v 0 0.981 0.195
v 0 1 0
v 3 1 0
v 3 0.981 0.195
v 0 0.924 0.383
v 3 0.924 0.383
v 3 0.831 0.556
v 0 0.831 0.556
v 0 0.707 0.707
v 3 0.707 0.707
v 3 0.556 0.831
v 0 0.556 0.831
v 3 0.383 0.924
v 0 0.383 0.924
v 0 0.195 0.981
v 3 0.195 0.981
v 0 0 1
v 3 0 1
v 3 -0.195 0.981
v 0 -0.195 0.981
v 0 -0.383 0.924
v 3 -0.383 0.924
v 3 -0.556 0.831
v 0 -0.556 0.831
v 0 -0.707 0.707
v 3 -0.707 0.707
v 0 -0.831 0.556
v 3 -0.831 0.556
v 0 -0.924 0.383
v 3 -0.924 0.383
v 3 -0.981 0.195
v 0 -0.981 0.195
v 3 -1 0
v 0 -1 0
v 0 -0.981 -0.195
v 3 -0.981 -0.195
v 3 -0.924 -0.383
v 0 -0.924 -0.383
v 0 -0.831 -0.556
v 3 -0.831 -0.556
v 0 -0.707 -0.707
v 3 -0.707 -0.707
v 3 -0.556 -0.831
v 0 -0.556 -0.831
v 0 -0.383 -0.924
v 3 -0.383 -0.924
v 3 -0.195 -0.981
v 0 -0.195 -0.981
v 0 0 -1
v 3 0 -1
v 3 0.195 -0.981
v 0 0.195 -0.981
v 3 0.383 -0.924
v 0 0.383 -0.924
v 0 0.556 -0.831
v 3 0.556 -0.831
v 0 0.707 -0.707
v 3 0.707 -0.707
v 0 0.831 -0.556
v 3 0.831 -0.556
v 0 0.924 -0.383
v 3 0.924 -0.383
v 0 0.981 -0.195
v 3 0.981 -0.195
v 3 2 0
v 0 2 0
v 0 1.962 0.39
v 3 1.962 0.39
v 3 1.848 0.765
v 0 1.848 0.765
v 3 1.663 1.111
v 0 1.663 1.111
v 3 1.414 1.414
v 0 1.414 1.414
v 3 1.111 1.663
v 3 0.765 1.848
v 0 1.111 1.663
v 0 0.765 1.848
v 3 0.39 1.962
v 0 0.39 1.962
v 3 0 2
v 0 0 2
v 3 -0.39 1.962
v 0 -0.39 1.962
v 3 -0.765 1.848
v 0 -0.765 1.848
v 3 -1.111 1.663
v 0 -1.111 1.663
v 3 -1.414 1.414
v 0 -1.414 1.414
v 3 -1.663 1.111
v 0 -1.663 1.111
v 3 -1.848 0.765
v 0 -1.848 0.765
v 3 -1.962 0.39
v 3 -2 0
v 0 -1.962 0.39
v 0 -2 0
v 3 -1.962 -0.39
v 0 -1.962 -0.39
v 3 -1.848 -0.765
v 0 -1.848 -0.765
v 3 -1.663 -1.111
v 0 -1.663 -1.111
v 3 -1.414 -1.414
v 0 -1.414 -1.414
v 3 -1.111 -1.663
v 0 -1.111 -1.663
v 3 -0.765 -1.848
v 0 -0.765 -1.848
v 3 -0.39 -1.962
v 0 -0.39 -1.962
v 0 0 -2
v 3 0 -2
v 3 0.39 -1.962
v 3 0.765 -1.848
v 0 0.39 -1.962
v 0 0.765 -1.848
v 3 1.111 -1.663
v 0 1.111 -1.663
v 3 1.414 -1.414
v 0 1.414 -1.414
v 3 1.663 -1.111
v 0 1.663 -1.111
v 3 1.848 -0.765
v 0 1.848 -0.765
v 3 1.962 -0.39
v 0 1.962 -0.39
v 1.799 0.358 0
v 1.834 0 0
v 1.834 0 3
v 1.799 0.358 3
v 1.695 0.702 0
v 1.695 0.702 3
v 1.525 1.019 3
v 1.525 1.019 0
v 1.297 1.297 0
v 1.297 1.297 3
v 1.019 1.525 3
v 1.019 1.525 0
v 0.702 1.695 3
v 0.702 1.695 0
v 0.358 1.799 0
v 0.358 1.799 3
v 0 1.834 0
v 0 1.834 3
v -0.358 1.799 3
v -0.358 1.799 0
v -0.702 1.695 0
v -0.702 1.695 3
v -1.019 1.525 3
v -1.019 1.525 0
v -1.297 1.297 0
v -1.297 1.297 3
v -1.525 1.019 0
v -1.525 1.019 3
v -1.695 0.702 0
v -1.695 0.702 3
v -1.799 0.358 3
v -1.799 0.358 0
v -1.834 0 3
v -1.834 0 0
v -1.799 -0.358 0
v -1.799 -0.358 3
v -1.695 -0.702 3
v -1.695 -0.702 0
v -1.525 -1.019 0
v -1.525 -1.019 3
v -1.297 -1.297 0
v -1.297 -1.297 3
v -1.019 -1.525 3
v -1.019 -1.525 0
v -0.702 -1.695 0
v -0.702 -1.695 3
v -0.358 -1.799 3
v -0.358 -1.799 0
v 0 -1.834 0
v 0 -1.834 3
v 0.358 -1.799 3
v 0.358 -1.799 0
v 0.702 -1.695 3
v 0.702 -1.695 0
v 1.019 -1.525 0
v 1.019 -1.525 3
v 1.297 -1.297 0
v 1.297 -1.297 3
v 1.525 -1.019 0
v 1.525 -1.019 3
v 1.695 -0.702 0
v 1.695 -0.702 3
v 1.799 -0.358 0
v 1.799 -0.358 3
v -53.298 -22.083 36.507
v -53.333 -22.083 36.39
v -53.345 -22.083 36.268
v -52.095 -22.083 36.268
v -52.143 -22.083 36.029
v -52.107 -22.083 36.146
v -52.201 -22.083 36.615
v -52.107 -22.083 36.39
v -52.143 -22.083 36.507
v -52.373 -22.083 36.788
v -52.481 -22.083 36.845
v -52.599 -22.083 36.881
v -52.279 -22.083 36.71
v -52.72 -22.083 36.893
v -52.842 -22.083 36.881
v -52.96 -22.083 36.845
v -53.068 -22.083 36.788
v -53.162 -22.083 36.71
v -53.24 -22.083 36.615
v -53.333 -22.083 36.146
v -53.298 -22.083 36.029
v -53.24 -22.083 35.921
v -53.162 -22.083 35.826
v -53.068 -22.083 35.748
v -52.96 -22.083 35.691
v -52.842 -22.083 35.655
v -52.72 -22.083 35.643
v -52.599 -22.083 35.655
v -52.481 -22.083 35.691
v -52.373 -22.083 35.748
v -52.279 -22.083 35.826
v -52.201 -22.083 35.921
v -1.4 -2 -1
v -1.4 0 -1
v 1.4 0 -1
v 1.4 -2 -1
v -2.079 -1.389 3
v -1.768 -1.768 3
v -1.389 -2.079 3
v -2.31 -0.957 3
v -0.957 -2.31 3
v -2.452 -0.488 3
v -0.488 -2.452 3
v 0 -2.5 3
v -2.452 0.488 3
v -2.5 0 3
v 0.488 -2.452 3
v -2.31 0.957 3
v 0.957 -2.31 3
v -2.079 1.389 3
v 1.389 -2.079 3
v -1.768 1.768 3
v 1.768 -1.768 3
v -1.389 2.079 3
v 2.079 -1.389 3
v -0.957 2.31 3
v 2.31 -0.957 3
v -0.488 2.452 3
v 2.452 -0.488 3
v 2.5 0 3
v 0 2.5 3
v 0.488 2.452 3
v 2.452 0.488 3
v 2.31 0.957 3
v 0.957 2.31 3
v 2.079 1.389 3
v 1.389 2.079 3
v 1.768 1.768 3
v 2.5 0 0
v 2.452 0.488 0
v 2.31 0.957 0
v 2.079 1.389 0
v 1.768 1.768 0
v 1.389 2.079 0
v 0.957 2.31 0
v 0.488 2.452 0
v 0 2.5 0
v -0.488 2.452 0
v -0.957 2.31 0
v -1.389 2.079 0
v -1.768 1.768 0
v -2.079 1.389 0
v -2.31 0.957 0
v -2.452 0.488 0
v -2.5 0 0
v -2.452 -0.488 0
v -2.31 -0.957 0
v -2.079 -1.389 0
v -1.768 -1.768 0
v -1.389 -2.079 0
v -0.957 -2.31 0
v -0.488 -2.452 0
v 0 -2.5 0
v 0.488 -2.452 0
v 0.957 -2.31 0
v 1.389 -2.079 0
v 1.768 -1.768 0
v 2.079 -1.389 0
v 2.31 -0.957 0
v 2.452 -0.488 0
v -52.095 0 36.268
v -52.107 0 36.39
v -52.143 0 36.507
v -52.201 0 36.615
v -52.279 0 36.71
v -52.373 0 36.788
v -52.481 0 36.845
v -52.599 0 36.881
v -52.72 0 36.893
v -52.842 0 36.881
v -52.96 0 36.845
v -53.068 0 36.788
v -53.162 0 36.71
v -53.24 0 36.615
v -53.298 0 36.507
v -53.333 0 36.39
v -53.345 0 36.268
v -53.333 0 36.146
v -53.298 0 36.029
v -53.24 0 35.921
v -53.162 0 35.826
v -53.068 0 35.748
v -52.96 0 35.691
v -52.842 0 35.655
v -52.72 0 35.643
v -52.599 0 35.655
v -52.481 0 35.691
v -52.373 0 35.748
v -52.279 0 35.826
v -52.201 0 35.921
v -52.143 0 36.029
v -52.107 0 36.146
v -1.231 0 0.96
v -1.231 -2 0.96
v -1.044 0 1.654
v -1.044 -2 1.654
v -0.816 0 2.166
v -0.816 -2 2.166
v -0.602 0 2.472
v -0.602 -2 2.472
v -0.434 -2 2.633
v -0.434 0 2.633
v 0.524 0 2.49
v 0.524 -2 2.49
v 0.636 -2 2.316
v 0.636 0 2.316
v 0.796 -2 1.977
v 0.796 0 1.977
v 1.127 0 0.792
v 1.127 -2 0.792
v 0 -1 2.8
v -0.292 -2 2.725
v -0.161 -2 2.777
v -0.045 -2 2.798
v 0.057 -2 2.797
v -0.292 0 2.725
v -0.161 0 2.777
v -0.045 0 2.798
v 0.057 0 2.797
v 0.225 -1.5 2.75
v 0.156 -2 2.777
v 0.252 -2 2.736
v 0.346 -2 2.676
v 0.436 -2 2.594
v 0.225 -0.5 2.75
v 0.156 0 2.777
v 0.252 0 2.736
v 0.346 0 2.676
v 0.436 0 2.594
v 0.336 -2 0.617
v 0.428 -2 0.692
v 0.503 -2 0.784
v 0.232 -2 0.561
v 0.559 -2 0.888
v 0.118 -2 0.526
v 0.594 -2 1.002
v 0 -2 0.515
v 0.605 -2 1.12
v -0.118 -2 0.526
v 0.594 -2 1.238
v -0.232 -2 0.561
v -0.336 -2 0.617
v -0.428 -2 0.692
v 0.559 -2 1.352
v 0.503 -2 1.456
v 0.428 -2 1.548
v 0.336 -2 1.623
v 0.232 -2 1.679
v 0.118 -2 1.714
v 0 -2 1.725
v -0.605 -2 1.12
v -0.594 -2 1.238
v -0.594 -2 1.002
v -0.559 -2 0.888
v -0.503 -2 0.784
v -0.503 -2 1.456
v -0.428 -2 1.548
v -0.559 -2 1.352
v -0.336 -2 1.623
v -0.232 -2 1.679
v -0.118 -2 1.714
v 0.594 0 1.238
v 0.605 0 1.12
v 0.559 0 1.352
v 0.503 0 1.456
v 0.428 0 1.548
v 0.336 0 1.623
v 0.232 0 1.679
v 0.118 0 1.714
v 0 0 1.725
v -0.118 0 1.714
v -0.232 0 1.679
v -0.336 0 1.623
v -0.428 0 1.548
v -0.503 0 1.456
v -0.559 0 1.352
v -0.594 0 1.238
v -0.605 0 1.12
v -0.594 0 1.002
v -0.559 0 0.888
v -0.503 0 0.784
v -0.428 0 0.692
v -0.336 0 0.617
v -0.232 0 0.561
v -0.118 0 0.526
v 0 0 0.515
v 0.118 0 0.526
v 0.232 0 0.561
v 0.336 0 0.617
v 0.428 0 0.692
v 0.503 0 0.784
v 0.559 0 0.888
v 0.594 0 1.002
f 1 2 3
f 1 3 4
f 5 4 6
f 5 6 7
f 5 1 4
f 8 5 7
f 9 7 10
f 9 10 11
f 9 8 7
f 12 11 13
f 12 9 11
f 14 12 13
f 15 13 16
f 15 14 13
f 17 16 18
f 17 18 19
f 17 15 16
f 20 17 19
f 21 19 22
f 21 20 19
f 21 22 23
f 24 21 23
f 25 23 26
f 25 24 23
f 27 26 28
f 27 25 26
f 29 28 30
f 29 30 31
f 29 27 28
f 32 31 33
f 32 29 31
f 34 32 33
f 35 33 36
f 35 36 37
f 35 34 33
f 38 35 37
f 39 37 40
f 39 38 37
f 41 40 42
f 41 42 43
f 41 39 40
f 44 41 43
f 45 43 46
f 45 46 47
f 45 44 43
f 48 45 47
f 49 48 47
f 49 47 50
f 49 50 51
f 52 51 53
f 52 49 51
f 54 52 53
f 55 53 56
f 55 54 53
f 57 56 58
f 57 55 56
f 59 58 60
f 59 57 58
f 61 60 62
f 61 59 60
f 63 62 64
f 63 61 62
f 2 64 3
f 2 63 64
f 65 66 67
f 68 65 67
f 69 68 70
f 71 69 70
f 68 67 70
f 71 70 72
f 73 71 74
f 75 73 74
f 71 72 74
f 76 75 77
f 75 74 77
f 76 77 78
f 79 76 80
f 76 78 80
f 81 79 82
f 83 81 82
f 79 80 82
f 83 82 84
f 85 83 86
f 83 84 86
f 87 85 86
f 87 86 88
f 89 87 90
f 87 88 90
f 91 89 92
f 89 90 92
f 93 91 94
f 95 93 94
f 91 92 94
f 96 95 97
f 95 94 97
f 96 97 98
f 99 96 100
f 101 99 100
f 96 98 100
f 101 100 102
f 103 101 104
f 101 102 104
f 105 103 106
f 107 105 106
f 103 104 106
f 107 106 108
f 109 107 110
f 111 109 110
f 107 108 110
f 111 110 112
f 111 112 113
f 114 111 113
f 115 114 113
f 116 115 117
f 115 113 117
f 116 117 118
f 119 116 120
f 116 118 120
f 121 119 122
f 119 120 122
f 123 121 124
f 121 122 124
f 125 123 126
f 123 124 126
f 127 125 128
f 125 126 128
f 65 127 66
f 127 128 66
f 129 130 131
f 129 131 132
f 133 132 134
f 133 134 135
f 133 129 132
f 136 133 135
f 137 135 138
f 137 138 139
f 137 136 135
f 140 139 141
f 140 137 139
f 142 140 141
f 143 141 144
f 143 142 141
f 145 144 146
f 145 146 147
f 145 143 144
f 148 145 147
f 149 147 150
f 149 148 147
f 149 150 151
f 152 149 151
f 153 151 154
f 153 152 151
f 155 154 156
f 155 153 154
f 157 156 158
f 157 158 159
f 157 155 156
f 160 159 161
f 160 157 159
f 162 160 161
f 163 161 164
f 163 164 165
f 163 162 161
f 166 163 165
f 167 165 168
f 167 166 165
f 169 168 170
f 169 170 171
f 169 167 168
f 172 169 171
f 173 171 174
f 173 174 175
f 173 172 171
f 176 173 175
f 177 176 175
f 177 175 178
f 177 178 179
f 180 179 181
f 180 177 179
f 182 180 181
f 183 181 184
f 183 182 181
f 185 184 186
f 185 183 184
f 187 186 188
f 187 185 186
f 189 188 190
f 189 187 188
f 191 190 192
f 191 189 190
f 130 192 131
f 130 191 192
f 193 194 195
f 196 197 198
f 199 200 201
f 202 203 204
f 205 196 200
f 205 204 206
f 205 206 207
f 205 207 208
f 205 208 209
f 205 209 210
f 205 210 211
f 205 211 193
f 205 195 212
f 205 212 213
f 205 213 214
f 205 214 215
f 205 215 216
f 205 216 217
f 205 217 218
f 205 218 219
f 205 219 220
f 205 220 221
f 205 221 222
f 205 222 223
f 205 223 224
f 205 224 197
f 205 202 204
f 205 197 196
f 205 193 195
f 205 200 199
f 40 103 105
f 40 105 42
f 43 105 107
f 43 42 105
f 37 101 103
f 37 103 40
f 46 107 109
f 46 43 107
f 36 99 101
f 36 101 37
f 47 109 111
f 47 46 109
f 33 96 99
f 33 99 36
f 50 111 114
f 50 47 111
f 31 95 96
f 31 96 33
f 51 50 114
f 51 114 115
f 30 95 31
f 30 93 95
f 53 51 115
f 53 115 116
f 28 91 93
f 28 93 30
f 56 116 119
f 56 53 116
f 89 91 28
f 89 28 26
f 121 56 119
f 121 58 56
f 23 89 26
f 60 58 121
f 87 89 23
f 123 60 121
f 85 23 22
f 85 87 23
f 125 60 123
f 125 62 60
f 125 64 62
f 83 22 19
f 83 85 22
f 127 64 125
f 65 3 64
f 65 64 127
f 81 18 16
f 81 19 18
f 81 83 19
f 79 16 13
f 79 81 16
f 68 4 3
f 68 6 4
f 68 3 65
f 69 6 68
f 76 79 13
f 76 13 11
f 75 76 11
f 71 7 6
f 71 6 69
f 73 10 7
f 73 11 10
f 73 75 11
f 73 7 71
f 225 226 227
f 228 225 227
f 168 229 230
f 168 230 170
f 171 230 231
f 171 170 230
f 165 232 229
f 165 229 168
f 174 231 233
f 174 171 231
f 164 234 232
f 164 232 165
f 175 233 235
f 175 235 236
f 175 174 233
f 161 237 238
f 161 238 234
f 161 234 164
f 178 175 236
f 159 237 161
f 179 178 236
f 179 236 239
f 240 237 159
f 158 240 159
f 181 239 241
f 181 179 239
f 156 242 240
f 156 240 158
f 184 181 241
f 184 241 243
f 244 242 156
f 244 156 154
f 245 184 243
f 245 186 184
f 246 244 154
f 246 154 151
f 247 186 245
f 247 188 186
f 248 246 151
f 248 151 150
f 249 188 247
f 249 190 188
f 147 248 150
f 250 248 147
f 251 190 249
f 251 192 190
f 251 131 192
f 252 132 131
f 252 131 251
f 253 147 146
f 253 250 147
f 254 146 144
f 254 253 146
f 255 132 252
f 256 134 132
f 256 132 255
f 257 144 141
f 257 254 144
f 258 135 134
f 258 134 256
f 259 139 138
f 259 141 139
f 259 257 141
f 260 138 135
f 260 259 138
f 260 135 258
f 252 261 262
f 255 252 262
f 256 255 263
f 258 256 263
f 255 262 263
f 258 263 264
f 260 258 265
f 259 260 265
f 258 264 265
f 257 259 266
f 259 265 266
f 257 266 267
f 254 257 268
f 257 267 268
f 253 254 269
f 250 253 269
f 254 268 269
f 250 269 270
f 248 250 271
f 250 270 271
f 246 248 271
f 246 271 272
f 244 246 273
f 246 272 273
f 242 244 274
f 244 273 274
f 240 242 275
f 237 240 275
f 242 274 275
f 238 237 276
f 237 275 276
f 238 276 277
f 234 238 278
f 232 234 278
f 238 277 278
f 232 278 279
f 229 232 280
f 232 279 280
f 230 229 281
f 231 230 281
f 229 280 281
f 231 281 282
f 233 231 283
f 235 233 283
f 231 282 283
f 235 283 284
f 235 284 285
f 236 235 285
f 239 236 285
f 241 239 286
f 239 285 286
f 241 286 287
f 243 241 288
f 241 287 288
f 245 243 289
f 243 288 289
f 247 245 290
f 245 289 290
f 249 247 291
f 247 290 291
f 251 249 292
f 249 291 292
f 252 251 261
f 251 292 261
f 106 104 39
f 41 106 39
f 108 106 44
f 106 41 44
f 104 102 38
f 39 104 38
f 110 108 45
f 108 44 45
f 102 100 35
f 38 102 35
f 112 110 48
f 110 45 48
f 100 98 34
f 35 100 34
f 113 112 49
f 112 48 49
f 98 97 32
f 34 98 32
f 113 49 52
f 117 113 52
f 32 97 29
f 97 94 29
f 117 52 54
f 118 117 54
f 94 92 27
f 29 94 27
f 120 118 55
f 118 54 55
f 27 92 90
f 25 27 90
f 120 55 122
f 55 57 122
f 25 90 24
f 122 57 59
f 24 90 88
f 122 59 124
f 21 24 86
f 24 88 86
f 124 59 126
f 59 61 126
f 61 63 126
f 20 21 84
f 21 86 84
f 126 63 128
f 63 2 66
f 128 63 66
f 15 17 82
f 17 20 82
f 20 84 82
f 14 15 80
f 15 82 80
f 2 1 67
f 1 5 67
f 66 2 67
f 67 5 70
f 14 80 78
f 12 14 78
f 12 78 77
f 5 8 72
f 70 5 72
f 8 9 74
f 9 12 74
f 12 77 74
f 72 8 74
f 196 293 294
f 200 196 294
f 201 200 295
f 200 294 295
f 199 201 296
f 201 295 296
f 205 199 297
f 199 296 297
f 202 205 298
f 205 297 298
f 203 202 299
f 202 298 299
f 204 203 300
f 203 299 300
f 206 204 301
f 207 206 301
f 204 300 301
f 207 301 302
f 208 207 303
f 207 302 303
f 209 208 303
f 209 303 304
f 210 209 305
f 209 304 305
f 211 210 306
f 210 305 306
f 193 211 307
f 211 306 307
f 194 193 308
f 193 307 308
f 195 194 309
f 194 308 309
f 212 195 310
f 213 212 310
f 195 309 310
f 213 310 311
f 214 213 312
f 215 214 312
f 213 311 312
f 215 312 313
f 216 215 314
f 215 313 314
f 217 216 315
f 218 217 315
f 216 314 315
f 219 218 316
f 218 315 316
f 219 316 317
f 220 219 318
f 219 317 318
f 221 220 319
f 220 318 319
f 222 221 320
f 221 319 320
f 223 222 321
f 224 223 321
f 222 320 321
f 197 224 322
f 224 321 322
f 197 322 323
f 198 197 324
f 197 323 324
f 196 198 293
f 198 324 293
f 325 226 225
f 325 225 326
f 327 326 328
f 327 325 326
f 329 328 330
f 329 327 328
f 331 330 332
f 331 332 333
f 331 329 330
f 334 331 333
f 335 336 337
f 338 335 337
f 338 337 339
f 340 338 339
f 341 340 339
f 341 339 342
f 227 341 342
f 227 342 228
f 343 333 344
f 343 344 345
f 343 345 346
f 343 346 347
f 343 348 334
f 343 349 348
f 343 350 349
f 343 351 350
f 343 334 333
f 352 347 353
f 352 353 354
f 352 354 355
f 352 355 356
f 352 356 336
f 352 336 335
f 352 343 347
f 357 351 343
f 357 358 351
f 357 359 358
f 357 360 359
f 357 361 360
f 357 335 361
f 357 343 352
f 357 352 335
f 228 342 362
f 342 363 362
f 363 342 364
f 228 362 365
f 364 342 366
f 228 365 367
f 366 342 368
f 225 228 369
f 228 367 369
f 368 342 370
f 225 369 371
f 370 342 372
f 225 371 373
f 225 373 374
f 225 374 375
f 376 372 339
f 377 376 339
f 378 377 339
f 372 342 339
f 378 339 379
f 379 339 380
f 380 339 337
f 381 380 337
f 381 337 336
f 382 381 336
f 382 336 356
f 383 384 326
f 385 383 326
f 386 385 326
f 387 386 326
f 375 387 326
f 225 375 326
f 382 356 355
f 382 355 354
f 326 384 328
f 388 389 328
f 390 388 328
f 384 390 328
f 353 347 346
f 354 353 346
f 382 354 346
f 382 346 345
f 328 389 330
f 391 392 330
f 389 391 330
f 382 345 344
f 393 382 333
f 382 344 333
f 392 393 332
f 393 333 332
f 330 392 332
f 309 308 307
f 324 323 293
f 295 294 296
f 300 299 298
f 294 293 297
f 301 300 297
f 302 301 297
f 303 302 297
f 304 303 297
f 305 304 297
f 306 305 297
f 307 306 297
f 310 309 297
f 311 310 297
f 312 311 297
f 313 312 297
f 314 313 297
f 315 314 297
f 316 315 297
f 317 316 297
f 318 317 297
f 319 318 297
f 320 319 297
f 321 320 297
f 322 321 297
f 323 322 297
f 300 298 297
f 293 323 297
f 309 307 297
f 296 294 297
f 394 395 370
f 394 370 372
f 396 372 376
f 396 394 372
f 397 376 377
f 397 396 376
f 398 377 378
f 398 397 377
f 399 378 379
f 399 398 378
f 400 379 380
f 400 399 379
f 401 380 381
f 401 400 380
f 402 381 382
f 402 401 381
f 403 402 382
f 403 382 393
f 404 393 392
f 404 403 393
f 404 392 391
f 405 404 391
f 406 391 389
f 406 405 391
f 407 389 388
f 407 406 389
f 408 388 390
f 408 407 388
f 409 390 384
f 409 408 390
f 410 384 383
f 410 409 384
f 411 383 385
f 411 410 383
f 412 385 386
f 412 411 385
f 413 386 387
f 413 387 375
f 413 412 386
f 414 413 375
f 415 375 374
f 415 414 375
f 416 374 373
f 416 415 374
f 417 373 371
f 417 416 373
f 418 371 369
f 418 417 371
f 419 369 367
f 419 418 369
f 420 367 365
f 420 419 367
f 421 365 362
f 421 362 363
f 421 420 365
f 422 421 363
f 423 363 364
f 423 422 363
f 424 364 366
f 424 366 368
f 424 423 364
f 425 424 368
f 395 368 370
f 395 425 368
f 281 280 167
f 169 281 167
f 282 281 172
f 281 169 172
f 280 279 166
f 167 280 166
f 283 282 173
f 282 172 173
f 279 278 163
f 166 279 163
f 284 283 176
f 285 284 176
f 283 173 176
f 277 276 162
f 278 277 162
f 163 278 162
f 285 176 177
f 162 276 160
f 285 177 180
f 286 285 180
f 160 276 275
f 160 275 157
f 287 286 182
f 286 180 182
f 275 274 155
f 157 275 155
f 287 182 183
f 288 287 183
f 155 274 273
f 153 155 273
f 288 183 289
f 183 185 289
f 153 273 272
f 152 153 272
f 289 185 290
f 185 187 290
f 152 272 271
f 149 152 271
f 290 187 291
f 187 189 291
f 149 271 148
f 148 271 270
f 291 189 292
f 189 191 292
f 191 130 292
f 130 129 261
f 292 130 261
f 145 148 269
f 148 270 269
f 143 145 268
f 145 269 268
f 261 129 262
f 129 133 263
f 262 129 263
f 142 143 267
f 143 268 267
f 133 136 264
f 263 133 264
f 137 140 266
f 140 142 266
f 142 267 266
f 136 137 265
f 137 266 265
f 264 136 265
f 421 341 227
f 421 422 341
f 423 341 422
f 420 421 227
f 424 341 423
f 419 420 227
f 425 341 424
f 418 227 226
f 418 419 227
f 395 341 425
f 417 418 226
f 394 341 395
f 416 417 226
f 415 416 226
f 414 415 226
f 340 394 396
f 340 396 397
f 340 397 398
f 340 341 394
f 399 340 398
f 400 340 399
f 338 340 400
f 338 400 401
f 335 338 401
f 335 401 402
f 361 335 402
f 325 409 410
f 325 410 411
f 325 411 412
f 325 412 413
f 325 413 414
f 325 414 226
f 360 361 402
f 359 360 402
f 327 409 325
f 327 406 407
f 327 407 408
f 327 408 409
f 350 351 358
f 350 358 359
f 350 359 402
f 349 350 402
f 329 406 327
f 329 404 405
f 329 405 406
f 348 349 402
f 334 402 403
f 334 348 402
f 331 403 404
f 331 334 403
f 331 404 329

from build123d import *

# Parameters (mm, degrees)
F0_R     = 0.625
F1_DEPTH = 22.08292
F2_R     = 2.5
F2_R_2   = 1.834161
F3_DEPTH = 3
F4_R     = 2
F4_R_2   = 1
F5_DEPTH = 3
F6_R     = 0.60531
F7_DEPTH = 2


with BuildPart() as f1:
    # F0 (on Front) → F1 (new body)
    with BuildSketch(Plane.XZ):
        with Locations((-52.720462, 36.268073)):
            Circle(F0_R)
    extrude(amount=F1_DEPTH)


with BuildPart() as f3:
    # F2 (on Top) → F3 (new body)
    with BuildSketch(Plane.XY):
        Circle(F2_R)
        Circle(F2_R_2, mode=Mode.SUBTRACT)
    extrude(amount=F3_DEPTH)


with BuildPart() as f5:
    # F4 (on Right) → F5 (new body)
    with BuildSketch(Plane.YZ):
        Circle(F4_R)
        Circle(F4_R_2, mode=Mode.SUBTRACT)
    extrude(amount=F5_DEPTH)


with BuildPart() as f7:
    # F6 (on Front) → F7 (new body)
    with BuildSketch(Plane.XZ):
        with BuildLine():
            add(Edge.make_bspline(
                [(-1.4, -1), (-1.4, 1.76), (0.16, 3.84), (1.08, 1.76), (1.4, -1)],
                knots=[0, 0, 0, 0, 4.049691, 8.099382, 8.099382, 8.099382, 8.099382], degree=3))
            Line((-1.4, -1), (1.4, -1))
        make_face()
        with Locations((0, 1.12)):
            Circle(F6_R, mode=Mode.SUBTRACT)
    extrude(amount=F7_DEPTH)


solid = Compound([f1.part, f3.part, f5.part, f7.part])
